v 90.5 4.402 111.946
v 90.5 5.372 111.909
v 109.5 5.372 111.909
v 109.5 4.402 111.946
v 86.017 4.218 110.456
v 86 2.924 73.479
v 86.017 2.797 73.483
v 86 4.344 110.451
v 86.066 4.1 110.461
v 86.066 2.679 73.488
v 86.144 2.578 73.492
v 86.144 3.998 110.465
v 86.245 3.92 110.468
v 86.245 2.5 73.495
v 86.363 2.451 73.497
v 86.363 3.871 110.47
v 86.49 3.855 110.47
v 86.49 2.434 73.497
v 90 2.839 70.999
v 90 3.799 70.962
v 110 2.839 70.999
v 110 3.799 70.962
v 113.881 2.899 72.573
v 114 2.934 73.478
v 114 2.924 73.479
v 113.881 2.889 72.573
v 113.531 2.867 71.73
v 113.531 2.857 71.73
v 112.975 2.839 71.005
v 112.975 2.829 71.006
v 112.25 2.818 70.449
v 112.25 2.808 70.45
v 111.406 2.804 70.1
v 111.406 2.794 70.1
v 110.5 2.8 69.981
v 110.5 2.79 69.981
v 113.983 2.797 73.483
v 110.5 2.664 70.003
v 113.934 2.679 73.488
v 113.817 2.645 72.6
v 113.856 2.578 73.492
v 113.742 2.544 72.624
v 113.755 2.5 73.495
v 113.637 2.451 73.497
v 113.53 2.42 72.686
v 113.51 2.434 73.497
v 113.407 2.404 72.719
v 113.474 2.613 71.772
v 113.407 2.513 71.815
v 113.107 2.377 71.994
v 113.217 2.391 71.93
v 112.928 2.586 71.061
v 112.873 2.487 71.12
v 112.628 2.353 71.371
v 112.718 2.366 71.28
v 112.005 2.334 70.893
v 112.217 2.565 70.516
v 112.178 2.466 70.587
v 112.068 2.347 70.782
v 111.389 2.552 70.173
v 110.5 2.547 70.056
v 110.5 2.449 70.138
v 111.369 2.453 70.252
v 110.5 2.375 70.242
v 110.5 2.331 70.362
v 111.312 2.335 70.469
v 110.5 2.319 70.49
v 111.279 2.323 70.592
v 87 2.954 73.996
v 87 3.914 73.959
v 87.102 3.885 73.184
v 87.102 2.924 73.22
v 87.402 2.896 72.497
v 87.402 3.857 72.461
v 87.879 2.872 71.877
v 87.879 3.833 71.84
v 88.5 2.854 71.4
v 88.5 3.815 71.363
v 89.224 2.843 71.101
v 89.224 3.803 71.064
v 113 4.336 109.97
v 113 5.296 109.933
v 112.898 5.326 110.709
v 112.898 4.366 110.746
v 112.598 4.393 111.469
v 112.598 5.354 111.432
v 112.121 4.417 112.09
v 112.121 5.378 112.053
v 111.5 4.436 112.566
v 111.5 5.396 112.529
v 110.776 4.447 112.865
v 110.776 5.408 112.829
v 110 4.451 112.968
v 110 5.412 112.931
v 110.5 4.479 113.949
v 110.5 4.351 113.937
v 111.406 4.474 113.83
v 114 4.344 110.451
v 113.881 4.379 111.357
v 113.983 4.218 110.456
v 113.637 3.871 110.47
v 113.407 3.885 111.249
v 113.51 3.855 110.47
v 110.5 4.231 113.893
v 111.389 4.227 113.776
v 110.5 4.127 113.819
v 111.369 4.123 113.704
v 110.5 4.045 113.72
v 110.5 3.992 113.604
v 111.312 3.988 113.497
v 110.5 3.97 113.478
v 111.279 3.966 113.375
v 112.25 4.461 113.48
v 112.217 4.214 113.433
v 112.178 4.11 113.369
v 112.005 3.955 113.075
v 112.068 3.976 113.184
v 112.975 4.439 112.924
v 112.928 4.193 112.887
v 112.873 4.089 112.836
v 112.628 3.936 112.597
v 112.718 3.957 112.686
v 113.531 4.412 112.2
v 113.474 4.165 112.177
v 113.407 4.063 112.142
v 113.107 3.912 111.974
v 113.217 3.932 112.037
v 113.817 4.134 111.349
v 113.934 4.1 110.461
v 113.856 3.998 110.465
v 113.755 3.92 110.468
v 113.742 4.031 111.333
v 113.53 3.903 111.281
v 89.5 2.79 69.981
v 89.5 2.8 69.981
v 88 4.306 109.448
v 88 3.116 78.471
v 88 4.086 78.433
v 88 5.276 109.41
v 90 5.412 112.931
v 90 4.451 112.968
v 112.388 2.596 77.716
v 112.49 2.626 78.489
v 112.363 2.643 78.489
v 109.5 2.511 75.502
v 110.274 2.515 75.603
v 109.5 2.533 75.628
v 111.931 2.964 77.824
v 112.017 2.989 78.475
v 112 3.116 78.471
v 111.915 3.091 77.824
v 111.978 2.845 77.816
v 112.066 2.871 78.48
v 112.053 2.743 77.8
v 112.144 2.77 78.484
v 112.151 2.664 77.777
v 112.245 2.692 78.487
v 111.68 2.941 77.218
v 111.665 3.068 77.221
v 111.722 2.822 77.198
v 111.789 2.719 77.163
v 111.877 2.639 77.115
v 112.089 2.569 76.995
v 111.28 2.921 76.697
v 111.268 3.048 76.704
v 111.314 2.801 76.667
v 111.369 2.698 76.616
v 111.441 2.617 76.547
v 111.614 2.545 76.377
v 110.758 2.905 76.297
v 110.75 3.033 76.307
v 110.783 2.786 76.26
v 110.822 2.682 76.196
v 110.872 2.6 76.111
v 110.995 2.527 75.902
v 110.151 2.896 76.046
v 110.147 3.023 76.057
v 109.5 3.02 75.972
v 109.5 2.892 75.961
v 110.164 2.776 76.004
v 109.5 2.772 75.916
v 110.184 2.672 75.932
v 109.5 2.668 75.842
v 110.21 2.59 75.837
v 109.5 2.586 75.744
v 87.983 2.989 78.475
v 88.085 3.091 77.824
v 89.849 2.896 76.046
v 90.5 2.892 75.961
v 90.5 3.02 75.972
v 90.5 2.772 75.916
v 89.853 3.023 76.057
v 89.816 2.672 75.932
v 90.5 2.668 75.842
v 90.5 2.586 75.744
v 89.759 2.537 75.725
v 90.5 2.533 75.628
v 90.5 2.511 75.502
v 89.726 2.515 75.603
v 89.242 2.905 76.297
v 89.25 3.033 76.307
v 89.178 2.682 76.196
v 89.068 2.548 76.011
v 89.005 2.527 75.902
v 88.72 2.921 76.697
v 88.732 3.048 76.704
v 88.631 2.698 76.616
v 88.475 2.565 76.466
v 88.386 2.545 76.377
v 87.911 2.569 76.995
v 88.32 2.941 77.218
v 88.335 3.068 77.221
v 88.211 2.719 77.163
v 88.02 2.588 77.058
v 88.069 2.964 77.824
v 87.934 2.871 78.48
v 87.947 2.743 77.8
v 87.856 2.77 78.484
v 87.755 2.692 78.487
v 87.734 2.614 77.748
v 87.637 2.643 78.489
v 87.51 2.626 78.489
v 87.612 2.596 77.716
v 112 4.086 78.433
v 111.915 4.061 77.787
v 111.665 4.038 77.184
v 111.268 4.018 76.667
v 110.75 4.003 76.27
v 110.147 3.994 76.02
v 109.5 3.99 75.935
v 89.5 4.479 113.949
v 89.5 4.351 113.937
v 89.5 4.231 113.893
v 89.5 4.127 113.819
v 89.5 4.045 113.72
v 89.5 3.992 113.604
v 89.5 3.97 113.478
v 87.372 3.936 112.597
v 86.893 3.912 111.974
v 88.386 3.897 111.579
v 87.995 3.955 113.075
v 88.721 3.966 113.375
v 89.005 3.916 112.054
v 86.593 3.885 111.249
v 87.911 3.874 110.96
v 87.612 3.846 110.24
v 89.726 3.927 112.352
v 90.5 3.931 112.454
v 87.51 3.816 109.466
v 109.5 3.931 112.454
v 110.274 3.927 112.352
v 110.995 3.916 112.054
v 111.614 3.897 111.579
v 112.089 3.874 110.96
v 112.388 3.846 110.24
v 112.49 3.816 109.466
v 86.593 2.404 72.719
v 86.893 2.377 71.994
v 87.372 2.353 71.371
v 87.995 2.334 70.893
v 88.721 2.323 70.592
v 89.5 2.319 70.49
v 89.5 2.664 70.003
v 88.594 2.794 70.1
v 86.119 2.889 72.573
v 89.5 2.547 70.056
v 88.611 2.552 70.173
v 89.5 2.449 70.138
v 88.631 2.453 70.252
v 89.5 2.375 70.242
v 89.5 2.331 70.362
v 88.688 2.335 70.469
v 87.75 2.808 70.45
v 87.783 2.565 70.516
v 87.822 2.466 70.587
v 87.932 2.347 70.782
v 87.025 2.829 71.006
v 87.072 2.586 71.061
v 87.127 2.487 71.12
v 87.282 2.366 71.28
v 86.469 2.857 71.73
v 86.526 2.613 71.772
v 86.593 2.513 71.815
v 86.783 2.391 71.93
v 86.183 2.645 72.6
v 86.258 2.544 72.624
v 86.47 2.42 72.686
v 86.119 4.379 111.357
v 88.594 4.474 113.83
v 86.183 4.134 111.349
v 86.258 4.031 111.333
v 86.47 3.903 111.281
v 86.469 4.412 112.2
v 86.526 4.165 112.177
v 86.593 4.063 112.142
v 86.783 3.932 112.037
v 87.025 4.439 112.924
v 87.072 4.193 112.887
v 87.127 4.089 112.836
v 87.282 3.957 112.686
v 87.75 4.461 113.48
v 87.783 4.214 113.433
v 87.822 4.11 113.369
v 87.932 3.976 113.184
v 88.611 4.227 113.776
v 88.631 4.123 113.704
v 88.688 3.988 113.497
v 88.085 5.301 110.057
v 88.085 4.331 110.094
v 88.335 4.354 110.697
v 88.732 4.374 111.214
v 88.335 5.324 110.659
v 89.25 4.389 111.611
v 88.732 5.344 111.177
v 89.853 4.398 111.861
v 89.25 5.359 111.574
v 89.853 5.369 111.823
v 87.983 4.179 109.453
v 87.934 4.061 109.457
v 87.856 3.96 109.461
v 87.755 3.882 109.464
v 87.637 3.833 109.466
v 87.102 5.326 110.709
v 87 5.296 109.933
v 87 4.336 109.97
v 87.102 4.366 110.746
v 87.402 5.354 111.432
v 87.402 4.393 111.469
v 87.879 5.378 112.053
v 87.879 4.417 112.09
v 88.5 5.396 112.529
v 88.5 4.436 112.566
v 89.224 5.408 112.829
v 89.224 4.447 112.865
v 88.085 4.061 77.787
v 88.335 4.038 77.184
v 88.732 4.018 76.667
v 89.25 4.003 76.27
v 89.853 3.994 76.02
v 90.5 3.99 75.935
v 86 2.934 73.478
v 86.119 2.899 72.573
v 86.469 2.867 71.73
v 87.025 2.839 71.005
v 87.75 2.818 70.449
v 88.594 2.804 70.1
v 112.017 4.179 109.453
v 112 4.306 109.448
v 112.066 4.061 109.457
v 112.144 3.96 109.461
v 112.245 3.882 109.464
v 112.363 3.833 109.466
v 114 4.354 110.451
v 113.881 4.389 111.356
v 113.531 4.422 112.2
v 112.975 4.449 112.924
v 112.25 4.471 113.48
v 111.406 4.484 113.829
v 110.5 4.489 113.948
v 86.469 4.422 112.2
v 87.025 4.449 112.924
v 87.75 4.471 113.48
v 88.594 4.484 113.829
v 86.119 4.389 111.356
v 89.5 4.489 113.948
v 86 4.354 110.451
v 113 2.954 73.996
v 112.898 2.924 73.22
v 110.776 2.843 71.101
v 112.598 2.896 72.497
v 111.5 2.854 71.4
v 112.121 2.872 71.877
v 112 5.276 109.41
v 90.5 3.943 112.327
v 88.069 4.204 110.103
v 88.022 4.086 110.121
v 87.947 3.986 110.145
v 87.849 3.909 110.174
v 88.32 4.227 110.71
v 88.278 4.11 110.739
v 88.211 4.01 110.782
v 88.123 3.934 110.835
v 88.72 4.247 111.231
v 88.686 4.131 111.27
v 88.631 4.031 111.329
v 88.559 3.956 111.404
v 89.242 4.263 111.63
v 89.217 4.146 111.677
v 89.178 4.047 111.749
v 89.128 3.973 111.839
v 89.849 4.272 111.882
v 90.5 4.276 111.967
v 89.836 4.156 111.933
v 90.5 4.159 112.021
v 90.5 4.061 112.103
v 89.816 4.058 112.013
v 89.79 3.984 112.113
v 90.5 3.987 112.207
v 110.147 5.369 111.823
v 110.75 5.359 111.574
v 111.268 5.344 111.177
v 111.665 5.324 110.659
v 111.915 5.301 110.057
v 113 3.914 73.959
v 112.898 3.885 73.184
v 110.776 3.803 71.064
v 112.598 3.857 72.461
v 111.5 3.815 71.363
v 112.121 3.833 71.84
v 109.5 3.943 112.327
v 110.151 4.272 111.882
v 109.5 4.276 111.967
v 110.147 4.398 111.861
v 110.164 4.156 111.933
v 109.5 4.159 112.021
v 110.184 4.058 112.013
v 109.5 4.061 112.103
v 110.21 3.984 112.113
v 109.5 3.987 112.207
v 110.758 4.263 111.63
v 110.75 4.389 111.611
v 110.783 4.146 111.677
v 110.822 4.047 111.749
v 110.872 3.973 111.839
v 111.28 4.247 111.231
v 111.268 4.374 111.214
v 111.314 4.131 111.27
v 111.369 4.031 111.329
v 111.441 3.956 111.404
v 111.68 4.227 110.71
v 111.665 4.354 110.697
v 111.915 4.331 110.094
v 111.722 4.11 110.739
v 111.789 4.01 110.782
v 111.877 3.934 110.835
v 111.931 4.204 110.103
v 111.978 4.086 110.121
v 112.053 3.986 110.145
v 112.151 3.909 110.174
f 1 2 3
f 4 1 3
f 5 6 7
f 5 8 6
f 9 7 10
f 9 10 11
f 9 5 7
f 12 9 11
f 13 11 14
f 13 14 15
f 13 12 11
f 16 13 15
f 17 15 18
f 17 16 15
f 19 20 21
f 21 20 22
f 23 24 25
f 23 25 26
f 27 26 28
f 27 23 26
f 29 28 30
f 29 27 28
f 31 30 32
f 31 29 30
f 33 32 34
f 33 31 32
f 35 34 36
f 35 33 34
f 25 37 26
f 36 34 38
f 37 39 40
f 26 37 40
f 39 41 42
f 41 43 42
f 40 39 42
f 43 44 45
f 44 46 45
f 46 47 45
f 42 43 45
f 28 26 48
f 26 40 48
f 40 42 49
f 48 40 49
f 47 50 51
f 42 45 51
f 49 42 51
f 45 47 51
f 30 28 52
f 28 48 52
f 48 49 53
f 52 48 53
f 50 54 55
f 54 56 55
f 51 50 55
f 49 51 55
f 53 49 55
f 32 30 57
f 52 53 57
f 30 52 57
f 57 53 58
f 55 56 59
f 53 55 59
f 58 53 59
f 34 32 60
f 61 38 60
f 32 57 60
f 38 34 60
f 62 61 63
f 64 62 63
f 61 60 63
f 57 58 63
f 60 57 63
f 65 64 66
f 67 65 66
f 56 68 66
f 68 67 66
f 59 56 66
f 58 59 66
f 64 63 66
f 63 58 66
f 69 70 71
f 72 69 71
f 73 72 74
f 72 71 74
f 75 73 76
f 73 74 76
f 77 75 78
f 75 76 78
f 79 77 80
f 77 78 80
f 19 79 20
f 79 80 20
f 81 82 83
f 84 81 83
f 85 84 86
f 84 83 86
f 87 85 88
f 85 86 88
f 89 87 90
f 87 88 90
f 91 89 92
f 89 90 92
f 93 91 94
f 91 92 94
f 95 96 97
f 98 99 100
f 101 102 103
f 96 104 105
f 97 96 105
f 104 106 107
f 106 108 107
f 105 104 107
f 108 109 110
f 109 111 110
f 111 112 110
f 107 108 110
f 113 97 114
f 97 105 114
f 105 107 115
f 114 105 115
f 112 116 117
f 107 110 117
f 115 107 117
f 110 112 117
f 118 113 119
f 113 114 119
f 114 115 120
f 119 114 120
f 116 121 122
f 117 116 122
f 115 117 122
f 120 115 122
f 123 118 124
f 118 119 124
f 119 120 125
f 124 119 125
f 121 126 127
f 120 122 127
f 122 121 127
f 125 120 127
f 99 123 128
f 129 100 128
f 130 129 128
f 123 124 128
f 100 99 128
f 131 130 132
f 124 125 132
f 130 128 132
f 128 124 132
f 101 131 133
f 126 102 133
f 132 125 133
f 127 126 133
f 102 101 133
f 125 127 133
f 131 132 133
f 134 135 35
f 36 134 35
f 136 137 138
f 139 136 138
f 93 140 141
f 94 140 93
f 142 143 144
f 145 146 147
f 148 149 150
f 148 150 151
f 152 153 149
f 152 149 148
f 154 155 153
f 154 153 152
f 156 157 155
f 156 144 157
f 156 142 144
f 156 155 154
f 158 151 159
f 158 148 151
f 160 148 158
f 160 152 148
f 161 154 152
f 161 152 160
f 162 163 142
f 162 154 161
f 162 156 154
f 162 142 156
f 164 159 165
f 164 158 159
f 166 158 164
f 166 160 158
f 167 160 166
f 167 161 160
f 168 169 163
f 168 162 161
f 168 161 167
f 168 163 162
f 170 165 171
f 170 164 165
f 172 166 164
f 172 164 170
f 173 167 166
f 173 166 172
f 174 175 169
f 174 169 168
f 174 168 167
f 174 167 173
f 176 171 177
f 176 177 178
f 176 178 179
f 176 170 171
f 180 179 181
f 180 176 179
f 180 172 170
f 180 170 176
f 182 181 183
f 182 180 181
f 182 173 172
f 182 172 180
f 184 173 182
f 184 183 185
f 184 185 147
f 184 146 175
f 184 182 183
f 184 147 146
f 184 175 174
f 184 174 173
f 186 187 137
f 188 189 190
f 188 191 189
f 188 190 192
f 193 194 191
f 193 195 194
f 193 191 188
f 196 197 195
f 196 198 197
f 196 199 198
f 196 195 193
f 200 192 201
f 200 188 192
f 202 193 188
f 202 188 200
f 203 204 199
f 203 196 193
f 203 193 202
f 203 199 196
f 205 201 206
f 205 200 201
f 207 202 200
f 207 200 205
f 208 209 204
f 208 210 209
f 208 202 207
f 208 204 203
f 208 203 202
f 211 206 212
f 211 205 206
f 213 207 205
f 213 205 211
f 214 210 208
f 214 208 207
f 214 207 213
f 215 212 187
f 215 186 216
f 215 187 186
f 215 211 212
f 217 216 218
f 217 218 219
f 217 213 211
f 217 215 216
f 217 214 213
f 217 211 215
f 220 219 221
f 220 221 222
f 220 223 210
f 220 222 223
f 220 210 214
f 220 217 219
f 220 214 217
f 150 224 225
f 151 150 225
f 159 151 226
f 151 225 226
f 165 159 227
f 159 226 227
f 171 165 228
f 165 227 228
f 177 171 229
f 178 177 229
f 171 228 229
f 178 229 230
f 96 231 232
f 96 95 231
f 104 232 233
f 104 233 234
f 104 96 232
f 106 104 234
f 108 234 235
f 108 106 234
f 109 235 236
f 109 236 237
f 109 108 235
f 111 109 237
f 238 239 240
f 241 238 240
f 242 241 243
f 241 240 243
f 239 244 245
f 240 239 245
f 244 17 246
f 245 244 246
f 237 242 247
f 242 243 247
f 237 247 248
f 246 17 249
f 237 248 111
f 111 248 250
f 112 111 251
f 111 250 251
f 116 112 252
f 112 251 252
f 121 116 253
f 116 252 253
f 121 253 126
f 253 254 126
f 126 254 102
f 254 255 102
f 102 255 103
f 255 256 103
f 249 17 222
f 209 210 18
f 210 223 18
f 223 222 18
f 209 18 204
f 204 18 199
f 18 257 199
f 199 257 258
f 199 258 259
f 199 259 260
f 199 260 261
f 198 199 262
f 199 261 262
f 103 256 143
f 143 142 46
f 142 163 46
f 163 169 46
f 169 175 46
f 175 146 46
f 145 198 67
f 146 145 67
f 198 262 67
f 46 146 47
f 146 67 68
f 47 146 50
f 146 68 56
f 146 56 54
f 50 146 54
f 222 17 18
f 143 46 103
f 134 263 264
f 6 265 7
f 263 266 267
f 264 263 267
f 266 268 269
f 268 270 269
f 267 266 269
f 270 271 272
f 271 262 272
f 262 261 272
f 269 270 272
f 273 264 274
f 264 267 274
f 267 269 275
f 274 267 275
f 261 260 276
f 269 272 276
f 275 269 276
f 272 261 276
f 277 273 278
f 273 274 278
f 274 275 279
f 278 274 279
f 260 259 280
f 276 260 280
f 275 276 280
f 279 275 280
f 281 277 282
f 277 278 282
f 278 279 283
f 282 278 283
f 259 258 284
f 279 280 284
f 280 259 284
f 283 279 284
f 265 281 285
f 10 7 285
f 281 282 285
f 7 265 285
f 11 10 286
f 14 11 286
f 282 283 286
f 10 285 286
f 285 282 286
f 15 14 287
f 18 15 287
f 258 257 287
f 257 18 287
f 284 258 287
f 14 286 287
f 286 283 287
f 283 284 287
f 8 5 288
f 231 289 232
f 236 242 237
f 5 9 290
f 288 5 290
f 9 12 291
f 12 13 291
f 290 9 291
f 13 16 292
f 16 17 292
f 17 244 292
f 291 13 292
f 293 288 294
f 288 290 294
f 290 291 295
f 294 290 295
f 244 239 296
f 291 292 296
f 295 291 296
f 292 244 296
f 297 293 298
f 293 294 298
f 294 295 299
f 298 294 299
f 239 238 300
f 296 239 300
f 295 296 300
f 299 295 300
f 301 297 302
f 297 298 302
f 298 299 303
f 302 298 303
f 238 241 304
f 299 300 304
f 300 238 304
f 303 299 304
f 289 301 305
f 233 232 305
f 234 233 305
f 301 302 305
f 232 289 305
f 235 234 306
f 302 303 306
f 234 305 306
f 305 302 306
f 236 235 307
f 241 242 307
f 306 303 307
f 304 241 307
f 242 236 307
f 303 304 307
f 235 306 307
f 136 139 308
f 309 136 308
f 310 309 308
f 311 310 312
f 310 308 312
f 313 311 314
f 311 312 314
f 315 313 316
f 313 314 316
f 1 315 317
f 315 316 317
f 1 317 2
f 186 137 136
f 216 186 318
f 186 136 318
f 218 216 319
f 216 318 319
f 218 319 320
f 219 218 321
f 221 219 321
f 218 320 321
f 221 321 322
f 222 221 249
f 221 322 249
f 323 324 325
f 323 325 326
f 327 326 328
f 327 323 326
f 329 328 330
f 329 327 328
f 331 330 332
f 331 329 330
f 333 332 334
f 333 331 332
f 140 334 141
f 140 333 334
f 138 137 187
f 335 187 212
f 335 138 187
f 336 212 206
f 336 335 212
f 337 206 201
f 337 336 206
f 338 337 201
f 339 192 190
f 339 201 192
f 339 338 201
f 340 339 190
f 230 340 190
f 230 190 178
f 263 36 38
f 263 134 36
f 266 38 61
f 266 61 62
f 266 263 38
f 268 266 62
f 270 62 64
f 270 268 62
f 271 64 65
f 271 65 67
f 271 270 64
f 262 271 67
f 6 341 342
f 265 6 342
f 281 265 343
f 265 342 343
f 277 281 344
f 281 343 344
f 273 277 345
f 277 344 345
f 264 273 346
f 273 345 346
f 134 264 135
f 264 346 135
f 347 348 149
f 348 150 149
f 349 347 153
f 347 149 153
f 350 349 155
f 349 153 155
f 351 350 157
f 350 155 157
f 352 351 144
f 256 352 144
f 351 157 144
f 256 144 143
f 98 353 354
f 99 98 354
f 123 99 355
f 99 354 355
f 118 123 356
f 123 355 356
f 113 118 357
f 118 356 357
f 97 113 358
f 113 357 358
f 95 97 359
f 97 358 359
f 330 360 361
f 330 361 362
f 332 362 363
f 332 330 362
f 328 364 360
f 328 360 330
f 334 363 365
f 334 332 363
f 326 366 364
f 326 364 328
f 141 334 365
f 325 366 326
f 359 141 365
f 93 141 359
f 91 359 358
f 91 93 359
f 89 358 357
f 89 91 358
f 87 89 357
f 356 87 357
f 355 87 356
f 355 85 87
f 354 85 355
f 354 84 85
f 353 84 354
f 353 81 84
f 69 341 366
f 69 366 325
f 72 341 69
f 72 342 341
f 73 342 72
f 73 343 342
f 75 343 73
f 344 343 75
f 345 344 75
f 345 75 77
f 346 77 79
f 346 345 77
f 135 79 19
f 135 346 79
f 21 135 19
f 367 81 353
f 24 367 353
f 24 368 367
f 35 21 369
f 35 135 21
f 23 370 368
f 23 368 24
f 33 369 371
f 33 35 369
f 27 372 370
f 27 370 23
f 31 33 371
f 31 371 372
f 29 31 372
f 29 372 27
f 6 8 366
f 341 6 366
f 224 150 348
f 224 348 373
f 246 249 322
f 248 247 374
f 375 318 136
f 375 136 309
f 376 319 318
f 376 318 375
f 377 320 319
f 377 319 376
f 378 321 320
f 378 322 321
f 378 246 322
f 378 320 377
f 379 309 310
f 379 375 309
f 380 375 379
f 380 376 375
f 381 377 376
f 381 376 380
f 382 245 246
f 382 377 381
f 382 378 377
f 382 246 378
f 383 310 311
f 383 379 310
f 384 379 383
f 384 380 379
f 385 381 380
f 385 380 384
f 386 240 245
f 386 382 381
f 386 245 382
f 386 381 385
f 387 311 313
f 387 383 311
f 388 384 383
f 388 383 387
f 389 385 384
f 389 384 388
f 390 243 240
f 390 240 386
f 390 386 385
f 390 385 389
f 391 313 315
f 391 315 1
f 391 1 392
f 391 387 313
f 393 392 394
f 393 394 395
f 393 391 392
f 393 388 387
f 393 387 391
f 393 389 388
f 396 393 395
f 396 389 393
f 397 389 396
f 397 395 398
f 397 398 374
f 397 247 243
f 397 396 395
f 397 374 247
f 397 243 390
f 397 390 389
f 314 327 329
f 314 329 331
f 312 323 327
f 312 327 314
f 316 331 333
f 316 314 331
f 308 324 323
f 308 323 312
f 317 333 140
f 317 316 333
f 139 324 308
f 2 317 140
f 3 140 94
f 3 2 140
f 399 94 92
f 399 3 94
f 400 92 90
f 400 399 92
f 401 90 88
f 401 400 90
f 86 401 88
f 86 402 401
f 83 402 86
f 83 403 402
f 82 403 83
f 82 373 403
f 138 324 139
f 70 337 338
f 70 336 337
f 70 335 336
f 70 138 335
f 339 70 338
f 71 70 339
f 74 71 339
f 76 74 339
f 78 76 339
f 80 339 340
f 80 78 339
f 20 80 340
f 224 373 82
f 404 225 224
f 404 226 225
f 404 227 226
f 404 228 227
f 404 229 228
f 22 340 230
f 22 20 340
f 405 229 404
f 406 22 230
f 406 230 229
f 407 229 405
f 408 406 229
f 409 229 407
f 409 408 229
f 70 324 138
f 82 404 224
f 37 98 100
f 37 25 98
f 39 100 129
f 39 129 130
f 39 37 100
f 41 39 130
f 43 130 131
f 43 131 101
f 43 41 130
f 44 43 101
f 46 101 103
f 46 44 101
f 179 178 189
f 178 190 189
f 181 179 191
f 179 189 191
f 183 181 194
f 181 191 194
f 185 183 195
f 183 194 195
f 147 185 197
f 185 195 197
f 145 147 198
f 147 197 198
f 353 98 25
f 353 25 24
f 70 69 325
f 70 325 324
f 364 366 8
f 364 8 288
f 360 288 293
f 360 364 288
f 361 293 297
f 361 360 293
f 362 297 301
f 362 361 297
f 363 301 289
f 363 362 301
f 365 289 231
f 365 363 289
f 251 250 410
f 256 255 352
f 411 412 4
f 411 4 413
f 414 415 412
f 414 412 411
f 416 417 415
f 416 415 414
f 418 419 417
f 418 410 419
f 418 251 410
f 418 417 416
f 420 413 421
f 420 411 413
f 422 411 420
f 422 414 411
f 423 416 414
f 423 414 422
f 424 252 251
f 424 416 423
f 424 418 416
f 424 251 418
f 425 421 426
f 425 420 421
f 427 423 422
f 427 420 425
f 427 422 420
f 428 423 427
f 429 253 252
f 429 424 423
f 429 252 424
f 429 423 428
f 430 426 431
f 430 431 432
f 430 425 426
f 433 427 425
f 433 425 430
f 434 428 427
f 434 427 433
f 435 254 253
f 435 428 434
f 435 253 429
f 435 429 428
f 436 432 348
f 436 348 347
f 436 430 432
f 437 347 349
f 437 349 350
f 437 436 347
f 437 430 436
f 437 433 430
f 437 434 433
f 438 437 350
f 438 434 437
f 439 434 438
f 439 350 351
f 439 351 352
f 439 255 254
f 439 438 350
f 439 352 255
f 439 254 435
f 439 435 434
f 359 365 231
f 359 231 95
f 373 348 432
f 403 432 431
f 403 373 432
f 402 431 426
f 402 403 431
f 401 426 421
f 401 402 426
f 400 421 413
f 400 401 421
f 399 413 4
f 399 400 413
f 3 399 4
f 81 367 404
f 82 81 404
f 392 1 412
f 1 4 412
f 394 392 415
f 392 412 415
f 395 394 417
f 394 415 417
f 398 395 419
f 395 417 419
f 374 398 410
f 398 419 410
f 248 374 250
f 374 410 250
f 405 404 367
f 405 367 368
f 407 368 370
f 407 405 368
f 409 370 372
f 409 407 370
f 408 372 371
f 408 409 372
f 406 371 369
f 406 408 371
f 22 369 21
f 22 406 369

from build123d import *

# Parameters (mm, degrees)
BOX027_W          = 24
BOX027_H          = 6
BOX027_DEPTH      = 36
BOX027_ROLL_ANGLE = -2.2
FILLET029_R       = 2.5
BOX028_W          = 26
BOX028_H          = 1
BOX028_DEPTH      = 42
BOX028_ROLL_ANGLE = -2.2
FILLET030_R       = 3
BOX026_W          = 28
BOX026_H          = 0.5
BOX026_DEPTH      = 44
BOX026_ROLL_ANGLE = -2.2
FILLET028_R       = 3.5
FILLET031_R       = 0.49


with BuildPart() as fillet029:
    # Box027 → Box027 (new body)
    with BuildSketch(Plane.XY):
        with Locations((12, 3)):
            Rectangle(BOX027_W, BOX027_H)
    extrude(amount=BOX027_DEPTH)


with BuildPart() as fillet029_1:
    # Box027 roll: moved
    add(fillet029.part.rotate(Axis((0, 0, 0), (1, 0, 0)), BOX027_ROLL_ANGLE))


with BuildPart() as fillet029_2:
    # Box027 placement: moved
    add(fillet029_1.part.moved(Location((89, 4.3, 74))))

    # Fillet029
    fillet029_edges = [fillet029_2.edges().sort_by_distance(p)[0] for p in [
        (89, 8.67975, 109.858302),
        (89, 7.297789, 73.884837),
        (113, 8.67975, 109.858302),
        (113, 7.297789, 73.884837),
    ]]
    fillet(fillet029_edges, radius=FILLET029_R)


with BuildPart() as fillet029_3:
    # Fillet029 placement: moved
    add(fillet029_2.part.moved(Location((-1, -2, 2))))


with BuildPart() as fillet030:
    # Box028 → Box028 (new body)
    with BuildSketch(Plane.XY):
        with Locations((13, 0.5)):
            Rectangle(BOX028_W, BOX028_H)
    extrude(amount=BOX028_DEPTH)


with BuildPart() as fillet030_1:
    # Box028 roll: moved
    add(fillet030.part.rotate(Axis((0, 0, 0), (1, 0, 0)), BOX028_ROLL_ANGLE))


with BuildPart() as fillet030_2:
    # Box028 placement: moved
    add(fillet030_1.part.moved(Location((90, 4.3, 71))))

    # Fillet030
    fillet030_edges = [fillet030_2.edges().sort_by_distance(p)[0] for p in [
        (90, 6.411919, 112.949849),
        (90, 4.799631, 70.980806),
        (116, 6.411919, 112.949849),
        (116, 4.799631, 70.980806),
    ]]
    fillet(fillet030_edges, radius=FILLET030_R)


with BuildPart() as fillet030_3:
    # Fillet030 placement: moved
    add(fillet030_2.part.moved(Location((-3, -1.5, 0))))


with BuildPart() as fillet031:
    # Box026 → Box026 (new body)
    with BuildSketch(Plane.XY):
        with Locations((14, 0.25)):
            Rectangle(BOX026_W, BOX026_H)
    extrude(amount=BOX026_DEPTH)


with BuildPart() as fillet031_1:
    # Box026 roll: moved
    add(fillet031.part.rotate(Axis((0, 0, 0), (1, 0, 0)), BOX026_ROLL_ANGLE))


with BuildPart() as fillet031_2:
    # Box026 placement: moved
    add(fillet031_1.part.moved(Location((89, 4.3, 70))))

    # Fillet028
    fillet028_edges = [fillet031_2.edges().sort_by_distance(p)[0] for p in [
        (89, 6.238879, 113.957971),
        (89, 4.549816, 69.990403),
        (117, 6.238879, 113.957971),
        (117, 4.549816, 69.990403),
    ]]
    fillet(fillet028_edges, radius=FILLET028_R)


with BuildPart() as fillet031_3:
    # Fillet028 placement: moved
    add(fillet031_2.part.moved(Location((-3, -2, 0))))

    # Fusion003: union Fillet030
    add(fillet030_3.part)

    # Cut018: cut Fillet029
    add(fillet029_3.part, mode=Mode.SUBTRACT)

    # Fillet031
    fillet031_edges = [fillet031_3.edges().sort_by_distance(p)[0] for p in [
        (86, 3.144532, 91.983784),
        (88, 3.221138, 93.977891),
    ]]
    fillet(fillet031_edges, radius=FILLET031_R)


solid = fillet031_3.part
